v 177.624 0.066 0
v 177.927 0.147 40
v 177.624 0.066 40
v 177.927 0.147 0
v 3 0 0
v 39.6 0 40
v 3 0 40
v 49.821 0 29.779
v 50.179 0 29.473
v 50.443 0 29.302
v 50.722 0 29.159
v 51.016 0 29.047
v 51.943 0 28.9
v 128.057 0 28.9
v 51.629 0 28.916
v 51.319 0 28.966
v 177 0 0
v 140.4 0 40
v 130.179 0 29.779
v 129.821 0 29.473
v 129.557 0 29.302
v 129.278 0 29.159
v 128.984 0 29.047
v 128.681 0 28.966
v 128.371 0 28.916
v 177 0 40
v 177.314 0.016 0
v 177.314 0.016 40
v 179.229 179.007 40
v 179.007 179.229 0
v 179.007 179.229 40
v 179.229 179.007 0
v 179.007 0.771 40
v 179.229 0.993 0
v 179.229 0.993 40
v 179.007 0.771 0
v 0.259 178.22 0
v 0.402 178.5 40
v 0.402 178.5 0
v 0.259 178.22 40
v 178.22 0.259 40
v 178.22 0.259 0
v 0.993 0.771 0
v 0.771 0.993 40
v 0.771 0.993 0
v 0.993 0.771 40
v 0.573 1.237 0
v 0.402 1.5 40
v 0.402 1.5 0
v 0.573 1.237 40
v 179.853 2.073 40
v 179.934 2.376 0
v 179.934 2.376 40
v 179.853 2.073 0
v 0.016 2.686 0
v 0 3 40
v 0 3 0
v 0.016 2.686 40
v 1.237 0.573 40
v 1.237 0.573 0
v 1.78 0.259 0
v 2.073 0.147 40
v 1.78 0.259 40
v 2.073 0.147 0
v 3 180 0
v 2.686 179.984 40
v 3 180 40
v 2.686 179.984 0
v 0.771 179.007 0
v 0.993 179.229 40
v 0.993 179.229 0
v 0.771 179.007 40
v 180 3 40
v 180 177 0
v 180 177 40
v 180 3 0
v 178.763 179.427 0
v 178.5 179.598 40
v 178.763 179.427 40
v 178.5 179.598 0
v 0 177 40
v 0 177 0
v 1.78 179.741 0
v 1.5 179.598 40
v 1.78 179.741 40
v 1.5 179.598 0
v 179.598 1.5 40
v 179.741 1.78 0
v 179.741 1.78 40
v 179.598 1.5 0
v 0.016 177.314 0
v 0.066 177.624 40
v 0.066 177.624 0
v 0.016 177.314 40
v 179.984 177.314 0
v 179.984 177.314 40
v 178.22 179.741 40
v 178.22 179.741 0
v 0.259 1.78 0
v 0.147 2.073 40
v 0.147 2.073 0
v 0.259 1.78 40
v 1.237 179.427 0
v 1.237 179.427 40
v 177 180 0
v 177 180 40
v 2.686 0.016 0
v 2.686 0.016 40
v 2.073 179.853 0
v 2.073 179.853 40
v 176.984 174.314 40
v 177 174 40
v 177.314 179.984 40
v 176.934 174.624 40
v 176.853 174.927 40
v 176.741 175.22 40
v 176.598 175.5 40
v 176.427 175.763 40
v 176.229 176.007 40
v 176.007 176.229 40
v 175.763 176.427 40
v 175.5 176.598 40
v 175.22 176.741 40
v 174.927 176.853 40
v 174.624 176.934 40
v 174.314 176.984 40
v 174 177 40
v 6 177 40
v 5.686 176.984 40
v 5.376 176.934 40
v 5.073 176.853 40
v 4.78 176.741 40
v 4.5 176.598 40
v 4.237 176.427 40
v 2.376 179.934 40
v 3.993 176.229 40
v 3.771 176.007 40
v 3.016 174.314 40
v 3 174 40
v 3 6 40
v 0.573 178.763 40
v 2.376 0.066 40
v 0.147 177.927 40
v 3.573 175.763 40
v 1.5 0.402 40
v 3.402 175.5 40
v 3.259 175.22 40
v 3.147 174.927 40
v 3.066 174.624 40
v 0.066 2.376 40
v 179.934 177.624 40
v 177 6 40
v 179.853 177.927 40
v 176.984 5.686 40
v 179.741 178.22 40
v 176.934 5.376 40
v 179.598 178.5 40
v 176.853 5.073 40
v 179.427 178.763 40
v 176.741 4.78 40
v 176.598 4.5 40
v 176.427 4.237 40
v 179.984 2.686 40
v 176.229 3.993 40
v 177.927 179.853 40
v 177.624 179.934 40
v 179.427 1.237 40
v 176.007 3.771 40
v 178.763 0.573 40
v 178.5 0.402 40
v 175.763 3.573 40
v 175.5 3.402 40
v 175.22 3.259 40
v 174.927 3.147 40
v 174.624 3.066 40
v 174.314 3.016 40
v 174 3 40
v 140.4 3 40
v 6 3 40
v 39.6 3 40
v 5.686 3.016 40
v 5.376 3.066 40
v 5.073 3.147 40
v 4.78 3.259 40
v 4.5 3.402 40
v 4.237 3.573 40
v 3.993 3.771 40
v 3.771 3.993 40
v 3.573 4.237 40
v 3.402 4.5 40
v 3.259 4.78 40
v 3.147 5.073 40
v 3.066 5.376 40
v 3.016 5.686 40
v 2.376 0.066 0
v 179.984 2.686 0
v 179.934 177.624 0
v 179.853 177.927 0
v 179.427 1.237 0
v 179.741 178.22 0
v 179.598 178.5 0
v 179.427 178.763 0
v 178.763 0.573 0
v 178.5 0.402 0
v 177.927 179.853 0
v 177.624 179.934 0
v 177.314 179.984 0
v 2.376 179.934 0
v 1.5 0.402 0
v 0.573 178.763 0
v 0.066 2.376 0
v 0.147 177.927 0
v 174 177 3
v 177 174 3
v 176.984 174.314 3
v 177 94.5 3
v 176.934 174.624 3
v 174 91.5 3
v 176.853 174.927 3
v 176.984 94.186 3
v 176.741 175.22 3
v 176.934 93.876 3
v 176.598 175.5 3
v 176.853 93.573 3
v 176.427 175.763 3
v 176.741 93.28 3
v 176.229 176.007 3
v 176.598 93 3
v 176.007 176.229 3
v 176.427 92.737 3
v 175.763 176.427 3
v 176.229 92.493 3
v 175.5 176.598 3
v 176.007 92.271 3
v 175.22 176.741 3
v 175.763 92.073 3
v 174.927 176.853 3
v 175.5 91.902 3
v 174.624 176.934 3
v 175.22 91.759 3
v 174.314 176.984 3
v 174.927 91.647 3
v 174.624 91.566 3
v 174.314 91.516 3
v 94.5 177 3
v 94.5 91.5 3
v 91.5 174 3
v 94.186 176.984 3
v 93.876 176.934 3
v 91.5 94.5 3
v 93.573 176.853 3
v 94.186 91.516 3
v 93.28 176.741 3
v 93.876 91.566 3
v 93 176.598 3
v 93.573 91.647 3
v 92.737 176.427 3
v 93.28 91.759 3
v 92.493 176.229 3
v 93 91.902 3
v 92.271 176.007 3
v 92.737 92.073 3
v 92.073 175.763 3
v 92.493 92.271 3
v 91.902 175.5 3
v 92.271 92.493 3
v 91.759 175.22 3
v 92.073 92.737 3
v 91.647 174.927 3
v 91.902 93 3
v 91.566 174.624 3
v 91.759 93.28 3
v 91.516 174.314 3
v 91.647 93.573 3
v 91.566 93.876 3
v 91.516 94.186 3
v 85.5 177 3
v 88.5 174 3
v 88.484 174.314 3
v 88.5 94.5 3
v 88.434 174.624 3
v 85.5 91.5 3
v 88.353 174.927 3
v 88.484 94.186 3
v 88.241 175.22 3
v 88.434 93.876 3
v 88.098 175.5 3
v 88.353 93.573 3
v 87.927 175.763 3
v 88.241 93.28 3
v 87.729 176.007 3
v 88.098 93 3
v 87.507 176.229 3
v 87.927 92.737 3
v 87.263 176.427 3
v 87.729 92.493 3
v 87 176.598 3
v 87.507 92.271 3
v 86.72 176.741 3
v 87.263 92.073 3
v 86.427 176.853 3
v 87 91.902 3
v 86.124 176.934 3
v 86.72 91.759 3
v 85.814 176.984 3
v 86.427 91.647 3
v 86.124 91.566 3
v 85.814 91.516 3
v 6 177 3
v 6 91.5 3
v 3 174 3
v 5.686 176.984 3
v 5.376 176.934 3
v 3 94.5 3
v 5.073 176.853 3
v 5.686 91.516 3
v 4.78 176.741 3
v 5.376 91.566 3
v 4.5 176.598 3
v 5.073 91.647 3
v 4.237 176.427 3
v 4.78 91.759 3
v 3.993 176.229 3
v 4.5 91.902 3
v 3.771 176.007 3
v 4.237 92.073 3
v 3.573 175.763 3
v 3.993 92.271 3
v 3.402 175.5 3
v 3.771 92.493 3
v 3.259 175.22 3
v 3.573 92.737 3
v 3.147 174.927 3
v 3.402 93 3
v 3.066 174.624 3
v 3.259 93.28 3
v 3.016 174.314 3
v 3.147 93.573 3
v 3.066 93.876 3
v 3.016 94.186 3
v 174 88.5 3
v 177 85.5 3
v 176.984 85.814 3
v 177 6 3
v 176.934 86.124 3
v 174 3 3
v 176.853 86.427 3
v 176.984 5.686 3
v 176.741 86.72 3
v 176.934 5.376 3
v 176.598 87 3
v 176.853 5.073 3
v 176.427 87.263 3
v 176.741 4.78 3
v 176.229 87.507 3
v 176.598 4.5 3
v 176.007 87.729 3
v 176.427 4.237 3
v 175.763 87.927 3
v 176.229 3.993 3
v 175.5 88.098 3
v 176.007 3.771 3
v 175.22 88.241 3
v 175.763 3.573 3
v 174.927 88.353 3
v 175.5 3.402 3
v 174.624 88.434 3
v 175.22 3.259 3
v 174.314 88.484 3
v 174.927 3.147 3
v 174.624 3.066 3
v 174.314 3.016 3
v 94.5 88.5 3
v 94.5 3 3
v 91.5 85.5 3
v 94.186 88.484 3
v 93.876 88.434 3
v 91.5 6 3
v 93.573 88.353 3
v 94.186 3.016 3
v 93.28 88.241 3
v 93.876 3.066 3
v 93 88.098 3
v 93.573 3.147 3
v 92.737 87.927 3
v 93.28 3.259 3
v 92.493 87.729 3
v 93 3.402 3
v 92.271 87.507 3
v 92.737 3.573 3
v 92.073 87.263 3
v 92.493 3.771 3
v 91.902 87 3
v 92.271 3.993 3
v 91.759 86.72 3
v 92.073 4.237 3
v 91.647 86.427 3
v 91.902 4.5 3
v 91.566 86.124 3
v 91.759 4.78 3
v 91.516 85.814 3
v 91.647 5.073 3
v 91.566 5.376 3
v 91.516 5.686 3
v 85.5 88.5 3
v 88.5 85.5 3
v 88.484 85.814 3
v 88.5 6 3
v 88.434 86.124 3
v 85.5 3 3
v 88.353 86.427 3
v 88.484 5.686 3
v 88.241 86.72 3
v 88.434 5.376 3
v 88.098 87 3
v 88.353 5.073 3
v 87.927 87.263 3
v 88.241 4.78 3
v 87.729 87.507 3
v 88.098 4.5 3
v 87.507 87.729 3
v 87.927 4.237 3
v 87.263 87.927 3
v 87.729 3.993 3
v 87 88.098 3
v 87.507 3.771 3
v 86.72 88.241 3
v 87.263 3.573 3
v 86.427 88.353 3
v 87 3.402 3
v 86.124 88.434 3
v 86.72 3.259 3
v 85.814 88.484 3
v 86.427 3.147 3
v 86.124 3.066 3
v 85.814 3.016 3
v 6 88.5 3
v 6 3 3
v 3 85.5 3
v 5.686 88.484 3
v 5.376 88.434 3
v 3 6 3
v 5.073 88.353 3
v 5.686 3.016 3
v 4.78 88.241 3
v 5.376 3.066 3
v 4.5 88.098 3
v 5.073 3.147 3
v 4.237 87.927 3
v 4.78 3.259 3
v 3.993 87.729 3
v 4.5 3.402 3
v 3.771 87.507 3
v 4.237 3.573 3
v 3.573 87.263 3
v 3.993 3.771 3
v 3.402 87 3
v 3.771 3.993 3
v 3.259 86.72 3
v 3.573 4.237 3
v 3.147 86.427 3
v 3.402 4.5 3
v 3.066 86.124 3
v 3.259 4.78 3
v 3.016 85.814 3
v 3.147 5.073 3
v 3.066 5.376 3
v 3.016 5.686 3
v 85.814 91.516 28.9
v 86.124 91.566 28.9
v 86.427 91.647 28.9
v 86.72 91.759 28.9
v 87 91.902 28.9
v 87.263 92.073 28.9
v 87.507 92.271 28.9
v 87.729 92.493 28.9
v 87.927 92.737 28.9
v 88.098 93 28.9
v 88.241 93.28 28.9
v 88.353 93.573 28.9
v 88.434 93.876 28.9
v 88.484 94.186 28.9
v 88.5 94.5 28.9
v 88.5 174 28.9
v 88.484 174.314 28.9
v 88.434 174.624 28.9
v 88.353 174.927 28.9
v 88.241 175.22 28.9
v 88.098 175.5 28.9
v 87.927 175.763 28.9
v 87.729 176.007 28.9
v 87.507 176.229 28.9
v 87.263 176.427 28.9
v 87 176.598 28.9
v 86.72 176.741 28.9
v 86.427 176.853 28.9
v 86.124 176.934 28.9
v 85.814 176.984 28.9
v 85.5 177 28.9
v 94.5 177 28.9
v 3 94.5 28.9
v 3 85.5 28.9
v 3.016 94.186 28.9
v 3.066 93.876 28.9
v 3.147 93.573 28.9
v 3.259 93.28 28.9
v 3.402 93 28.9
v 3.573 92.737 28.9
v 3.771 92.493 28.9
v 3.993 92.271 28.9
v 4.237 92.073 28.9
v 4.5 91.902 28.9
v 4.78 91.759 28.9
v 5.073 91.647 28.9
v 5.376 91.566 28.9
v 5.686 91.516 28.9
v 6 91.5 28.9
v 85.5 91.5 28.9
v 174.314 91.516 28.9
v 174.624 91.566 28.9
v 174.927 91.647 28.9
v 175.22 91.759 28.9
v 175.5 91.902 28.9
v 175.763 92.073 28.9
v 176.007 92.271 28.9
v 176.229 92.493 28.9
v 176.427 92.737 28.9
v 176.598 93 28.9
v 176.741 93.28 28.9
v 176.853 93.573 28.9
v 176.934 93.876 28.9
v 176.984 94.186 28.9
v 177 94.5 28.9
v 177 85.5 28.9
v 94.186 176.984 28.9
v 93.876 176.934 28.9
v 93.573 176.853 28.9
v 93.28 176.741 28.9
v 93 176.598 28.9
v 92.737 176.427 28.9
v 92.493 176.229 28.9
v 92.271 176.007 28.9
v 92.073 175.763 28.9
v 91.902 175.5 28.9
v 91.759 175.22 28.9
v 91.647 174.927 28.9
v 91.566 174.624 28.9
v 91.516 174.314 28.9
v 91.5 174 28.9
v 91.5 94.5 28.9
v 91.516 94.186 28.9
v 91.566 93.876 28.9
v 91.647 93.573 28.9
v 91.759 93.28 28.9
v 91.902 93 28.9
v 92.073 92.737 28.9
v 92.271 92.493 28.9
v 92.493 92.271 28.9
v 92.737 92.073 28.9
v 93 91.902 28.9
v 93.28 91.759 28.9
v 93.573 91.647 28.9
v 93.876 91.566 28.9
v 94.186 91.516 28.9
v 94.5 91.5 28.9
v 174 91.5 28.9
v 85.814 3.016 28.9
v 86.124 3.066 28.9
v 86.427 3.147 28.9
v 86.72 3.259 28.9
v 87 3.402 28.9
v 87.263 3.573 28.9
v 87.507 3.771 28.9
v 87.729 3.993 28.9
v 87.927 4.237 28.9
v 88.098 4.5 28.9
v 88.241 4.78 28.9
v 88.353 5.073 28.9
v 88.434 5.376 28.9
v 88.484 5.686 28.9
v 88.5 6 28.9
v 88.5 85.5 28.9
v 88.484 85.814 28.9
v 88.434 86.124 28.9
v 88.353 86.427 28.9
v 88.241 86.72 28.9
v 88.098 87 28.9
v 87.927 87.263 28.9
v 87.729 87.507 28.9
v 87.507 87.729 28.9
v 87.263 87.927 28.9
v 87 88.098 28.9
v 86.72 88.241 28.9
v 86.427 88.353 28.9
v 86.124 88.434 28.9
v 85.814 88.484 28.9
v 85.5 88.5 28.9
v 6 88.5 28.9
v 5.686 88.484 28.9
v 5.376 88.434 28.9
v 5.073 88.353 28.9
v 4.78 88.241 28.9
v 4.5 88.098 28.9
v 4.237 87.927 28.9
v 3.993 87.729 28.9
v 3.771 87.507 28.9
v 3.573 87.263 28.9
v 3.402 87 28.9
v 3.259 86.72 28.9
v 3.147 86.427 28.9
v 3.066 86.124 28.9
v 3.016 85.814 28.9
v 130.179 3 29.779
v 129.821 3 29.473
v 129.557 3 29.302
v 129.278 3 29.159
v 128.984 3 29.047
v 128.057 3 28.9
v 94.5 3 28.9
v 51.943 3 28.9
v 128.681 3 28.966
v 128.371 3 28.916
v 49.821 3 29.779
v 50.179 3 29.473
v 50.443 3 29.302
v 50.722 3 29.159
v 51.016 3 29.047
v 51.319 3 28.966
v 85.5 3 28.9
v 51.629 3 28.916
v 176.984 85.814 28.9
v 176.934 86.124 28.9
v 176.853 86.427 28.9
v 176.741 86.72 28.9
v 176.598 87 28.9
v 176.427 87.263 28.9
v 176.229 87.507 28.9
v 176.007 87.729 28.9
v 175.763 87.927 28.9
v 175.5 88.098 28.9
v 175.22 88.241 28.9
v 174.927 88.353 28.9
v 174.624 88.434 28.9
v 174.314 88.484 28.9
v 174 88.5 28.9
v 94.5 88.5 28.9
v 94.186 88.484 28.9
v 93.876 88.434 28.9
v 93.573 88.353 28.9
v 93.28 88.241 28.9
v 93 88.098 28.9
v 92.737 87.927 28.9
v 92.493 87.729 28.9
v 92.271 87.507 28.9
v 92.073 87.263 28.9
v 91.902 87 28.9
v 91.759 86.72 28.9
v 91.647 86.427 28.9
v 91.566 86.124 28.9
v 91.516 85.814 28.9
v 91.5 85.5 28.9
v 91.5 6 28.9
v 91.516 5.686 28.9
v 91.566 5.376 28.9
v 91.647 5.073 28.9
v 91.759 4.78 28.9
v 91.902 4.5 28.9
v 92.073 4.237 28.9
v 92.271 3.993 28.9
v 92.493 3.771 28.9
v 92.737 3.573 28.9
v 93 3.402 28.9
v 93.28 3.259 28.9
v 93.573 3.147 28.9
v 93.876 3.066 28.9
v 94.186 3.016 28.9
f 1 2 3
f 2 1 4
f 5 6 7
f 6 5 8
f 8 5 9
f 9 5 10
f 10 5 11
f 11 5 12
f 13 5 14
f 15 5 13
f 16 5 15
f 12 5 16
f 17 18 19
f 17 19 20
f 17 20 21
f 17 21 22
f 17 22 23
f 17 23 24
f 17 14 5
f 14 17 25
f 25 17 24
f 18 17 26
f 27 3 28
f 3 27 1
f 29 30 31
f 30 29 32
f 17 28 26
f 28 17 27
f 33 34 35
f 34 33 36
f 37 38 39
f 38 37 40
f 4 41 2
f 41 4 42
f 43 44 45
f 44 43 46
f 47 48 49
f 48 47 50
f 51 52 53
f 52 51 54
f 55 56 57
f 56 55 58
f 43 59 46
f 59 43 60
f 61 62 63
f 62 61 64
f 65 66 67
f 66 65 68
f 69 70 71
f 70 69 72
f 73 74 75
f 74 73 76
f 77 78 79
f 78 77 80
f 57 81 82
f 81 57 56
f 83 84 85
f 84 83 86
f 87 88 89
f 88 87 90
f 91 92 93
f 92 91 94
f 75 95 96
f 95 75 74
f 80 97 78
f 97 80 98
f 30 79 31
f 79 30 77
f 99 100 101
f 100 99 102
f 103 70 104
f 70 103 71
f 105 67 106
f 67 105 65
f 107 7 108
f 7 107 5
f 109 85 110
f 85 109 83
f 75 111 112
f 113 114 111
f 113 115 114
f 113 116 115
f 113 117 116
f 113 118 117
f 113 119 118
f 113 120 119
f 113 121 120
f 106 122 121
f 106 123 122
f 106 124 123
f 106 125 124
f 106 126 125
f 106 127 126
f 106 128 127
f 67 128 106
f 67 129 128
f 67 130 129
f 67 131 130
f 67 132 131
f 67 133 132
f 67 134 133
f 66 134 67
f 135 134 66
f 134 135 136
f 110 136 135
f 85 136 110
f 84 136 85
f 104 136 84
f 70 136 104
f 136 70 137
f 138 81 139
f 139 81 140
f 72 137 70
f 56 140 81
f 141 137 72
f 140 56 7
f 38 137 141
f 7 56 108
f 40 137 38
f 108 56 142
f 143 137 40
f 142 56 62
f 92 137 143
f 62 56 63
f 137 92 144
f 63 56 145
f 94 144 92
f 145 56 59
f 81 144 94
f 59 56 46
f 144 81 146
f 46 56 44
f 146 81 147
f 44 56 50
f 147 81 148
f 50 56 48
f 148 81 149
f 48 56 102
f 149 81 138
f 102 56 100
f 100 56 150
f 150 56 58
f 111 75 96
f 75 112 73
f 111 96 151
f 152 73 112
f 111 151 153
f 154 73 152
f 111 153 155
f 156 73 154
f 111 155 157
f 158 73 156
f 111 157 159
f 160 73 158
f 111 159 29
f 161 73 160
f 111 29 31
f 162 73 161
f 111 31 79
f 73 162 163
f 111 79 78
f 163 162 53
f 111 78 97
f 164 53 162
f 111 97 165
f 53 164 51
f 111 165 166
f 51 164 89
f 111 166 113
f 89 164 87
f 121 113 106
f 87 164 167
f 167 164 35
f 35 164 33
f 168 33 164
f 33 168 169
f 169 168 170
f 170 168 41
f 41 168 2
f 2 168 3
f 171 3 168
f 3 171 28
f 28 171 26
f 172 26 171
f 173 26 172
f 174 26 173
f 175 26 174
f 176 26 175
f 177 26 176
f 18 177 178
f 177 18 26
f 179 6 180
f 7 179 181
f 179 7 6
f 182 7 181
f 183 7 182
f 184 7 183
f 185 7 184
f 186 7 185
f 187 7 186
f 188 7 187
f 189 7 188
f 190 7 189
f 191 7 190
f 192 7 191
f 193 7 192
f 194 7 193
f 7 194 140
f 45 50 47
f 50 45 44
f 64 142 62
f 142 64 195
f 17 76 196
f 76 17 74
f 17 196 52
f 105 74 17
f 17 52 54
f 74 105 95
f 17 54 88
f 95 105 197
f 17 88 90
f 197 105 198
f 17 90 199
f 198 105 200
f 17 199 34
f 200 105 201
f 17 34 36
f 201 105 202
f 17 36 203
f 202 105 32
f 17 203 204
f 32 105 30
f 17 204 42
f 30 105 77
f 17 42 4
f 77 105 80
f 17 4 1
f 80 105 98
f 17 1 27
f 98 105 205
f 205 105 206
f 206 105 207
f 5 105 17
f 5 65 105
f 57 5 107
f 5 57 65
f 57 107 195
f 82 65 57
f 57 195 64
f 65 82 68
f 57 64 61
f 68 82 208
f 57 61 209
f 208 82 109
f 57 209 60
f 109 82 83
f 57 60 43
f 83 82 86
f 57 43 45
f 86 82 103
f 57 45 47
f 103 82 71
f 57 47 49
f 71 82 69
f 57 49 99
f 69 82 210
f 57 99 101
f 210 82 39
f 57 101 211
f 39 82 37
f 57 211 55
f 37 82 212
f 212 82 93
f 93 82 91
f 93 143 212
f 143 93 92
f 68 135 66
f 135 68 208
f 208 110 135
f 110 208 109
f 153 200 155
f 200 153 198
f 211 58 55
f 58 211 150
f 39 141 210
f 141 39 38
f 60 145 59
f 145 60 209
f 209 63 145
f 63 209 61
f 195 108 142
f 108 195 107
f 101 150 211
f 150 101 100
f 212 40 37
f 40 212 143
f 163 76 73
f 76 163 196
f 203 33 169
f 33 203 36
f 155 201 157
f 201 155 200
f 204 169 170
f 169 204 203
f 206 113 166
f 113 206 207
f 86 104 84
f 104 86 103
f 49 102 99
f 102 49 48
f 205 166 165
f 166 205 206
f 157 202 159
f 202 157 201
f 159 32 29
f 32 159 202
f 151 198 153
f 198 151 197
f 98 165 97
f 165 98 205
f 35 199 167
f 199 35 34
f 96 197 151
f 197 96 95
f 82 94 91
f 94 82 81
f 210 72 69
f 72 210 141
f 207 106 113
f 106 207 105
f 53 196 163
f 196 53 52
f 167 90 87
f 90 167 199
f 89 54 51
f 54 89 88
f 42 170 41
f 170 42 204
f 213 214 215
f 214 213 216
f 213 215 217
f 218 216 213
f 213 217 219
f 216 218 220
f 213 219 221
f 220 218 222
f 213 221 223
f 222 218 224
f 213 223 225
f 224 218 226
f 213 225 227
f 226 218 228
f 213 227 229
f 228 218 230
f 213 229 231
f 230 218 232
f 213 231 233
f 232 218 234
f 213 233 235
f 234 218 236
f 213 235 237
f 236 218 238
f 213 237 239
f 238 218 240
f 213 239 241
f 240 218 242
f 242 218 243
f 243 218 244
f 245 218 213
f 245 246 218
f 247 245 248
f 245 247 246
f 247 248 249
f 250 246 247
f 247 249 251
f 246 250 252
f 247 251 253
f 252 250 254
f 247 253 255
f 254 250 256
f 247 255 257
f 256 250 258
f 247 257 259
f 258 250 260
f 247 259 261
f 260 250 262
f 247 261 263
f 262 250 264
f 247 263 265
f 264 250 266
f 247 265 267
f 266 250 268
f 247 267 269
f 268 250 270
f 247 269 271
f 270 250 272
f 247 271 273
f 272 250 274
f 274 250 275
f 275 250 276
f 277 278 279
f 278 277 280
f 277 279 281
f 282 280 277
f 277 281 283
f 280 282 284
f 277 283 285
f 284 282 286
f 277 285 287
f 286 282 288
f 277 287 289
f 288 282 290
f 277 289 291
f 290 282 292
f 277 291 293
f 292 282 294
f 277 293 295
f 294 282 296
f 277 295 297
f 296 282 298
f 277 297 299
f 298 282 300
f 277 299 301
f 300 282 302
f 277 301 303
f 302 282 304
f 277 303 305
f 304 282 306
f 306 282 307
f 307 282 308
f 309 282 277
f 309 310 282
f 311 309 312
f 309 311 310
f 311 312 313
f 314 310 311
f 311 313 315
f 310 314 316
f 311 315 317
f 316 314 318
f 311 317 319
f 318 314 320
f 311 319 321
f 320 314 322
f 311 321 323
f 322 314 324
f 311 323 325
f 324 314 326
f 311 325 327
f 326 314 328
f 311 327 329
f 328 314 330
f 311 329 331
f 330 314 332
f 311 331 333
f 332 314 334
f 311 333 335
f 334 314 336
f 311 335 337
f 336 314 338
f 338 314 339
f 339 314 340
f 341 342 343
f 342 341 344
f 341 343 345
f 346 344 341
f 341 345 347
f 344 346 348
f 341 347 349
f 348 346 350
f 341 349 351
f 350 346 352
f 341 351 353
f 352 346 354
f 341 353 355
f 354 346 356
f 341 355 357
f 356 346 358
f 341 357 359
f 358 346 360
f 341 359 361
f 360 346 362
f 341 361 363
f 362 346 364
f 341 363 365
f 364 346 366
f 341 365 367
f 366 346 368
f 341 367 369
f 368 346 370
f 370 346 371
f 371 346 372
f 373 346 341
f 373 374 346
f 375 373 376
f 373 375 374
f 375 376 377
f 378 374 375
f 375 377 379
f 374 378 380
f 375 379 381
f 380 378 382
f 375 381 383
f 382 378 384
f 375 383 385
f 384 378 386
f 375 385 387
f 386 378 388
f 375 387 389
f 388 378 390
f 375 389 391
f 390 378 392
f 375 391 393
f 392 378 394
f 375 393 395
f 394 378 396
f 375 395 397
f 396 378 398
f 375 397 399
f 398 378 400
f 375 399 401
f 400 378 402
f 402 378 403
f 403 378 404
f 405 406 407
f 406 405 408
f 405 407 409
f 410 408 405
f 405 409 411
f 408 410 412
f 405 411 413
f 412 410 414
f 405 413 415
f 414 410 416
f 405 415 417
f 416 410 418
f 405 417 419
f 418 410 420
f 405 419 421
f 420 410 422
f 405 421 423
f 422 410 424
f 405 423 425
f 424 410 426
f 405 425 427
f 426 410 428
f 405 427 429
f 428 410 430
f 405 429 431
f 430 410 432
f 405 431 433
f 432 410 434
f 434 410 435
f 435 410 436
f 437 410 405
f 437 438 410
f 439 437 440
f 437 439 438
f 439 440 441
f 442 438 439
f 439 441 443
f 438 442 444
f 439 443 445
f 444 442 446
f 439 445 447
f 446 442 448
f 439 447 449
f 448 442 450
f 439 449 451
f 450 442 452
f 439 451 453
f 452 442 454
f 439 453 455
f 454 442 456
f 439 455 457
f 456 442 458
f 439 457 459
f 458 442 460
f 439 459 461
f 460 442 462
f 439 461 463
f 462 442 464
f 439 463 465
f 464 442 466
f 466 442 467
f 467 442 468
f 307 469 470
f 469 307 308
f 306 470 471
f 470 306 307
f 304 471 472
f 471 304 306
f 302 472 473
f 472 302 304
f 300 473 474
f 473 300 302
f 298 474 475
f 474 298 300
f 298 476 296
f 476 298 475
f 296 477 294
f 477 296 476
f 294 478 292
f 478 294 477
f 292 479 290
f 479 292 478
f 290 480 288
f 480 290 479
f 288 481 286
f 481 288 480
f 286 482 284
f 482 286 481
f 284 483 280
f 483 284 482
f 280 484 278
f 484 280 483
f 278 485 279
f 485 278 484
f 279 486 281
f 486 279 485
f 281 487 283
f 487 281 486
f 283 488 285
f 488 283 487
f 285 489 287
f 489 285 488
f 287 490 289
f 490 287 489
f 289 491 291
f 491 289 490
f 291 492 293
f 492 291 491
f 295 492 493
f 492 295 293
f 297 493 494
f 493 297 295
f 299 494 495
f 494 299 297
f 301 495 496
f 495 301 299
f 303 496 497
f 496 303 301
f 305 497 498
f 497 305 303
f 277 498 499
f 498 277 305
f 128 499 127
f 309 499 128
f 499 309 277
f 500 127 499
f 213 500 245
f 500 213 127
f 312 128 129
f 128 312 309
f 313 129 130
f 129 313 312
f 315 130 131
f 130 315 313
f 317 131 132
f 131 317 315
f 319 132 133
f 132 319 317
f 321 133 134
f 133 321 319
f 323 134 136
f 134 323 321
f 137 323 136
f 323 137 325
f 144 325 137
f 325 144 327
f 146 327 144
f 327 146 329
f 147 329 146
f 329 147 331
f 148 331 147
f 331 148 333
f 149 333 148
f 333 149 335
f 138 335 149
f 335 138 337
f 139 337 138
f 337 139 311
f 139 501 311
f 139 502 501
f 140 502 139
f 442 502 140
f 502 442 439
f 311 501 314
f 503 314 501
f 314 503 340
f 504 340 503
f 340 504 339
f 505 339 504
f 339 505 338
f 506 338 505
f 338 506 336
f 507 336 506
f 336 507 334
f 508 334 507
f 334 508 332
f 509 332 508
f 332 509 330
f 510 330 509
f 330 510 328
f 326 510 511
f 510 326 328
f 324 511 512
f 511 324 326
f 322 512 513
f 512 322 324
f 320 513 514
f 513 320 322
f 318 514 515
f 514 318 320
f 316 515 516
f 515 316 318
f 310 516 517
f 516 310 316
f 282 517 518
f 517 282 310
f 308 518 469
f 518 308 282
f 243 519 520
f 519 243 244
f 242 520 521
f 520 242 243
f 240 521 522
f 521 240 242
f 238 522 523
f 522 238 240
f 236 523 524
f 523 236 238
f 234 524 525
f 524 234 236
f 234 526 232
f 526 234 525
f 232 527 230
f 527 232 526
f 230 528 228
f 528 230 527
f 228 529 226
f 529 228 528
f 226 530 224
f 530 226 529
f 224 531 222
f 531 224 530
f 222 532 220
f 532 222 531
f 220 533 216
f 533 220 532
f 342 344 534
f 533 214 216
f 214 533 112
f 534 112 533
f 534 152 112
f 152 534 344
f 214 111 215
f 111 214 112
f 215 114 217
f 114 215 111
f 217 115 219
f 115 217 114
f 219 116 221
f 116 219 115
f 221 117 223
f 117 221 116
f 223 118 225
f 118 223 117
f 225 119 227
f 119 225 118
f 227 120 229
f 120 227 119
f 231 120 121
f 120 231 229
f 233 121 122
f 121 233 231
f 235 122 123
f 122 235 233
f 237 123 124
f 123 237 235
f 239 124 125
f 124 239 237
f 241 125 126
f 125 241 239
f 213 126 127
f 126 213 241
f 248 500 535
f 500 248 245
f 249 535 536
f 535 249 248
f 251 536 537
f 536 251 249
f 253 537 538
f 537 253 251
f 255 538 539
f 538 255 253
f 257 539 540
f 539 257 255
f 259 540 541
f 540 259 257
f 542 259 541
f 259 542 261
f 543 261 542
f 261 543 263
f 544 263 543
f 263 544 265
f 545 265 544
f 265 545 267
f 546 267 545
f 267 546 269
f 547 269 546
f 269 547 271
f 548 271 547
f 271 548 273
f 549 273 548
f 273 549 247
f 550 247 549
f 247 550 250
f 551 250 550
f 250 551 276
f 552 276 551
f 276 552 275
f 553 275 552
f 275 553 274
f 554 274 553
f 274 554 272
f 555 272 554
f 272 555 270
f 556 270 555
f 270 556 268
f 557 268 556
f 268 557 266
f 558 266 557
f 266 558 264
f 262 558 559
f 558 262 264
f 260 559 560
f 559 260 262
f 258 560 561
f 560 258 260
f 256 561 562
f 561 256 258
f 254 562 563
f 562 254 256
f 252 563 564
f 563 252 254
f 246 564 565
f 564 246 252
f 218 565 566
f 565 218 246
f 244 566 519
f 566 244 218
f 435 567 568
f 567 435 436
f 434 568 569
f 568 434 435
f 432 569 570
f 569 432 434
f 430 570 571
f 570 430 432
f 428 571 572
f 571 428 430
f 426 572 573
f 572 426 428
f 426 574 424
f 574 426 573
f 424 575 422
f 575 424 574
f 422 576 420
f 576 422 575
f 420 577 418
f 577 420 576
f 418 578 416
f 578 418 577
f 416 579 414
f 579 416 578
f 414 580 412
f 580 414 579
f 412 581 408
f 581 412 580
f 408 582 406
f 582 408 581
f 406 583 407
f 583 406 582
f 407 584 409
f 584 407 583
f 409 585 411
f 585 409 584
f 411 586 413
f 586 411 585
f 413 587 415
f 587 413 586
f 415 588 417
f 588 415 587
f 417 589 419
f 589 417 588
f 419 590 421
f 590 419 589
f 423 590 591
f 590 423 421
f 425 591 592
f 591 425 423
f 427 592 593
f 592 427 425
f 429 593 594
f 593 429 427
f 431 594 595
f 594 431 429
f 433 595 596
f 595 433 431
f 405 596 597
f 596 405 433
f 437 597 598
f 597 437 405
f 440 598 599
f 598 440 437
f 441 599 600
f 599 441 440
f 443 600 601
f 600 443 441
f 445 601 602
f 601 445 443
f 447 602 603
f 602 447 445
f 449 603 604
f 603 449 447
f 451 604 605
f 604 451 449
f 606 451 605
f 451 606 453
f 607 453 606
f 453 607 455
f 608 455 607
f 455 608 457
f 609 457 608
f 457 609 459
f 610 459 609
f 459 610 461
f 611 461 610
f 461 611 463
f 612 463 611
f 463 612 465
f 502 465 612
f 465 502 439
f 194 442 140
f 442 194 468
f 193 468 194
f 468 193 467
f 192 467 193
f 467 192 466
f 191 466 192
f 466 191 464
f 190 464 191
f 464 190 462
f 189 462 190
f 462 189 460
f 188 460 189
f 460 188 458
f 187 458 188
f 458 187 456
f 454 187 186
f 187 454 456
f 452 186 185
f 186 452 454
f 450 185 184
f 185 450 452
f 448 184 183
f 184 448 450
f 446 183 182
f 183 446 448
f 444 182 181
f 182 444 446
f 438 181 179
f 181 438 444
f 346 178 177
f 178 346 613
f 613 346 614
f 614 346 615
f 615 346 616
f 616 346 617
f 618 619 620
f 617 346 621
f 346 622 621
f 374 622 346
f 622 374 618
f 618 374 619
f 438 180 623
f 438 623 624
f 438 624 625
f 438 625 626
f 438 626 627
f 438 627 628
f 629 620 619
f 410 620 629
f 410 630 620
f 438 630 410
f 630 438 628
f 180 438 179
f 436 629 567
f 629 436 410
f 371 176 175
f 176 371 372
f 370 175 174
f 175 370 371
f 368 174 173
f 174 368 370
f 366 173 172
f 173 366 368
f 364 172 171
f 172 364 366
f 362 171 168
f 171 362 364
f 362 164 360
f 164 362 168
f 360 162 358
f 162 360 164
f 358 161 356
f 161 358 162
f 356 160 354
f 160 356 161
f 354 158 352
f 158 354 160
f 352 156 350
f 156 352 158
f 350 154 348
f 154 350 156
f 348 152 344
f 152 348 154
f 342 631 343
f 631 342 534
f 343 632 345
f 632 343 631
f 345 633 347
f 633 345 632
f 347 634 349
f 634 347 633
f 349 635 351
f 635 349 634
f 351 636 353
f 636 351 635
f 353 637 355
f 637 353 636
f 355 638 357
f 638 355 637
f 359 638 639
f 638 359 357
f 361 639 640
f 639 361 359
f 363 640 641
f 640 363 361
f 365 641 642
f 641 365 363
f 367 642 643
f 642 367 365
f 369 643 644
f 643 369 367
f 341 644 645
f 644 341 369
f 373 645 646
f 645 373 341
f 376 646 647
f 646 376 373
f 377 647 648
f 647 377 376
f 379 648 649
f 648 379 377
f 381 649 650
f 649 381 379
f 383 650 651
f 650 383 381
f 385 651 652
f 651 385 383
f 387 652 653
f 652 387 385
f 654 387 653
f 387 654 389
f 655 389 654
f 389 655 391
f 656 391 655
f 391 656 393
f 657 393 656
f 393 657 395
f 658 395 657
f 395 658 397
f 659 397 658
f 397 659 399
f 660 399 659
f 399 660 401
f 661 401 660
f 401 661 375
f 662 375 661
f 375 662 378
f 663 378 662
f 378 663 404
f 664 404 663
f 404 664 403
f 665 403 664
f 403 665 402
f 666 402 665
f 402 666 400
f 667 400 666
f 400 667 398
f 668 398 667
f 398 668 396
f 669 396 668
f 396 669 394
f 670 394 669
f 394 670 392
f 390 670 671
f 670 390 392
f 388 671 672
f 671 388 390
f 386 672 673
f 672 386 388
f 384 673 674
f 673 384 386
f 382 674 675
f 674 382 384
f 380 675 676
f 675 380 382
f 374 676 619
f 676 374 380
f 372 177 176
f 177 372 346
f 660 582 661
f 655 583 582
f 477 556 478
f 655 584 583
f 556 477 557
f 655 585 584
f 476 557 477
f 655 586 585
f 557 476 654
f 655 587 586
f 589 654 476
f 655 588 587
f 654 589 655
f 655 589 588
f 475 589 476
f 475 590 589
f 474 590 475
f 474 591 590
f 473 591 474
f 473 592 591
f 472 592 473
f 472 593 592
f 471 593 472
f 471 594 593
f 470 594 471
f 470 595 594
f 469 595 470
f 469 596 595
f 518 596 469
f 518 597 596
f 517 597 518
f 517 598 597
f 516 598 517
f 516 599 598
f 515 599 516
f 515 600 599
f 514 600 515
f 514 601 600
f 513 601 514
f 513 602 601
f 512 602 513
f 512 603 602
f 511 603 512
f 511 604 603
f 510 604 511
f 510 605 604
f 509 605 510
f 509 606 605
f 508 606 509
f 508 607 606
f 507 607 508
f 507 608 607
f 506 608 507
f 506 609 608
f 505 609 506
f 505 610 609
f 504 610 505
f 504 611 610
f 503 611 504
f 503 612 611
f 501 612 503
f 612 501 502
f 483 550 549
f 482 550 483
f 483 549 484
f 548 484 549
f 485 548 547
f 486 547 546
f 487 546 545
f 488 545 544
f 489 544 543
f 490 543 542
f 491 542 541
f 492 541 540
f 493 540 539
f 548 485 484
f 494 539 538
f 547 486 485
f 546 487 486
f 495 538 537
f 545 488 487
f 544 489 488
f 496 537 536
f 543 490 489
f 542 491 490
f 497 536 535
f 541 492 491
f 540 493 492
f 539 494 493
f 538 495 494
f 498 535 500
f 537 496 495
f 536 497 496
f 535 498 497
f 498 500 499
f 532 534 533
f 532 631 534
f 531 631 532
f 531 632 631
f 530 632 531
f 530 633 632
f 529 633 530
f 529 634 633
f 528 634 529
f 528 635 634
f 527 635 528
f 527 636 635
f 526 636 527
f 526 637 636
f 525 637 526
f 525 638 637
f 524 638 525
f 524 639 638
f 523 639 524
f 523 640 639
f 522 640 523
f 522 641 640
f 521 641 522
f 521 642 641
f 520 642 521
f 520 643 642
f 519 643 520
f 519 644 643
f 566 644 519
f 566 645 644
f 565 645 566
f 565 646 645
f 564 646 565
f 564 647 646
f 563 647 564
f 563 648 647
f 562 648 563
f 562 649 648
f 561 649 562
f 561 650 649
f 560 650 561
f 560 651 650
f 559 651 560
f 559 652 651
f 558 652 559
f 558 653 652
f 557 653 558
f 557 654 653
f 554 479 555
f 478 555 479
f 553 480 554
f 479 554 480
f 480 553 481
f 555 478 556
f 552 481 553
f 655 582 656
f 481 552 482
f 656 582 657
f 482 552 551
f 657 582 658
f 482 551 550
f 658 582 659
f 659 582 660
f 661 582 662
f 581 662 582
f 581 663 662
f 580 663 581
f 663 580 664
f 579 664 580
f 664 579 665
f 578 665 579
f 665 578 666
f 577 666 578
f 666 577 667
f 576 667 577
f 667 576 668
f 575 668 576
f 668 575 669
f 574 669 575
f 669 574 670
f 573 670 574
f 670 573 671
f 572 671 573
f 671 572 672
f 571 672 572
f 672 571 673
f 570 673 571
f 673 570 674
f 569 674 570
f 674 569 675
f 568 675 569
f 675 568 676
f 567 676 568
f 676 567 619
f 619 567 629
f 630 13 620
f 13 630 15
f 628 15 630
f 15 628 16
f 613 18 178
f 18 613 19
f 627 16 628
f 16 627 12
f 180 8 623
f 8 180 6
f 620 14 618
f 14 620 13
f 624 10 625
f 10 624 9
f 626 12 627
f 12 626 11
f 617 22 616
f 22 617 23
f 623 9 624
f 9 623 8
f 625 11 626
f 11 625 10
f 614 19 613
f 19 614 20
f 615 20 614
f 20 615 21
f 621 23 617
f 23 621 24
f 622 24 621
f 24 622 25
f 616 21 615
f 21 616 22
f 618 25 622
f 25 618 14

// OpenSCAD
/*
 * Copyright 2022 Code and Make (codeandmake.com)
 * 
 * Permission is hereby granted, free of charge, to any person obtaining a copy
 * of this software and associated documentation files (the "Software"), to deal
 * in the Software without restriction, including without limitation the rights
 * to use, copy, modify, merge, publish, distribute, sublicense, and/or sell
 * copies of the Software, and to permit persons to whom the Software is
 * furnished to do so, subject to the following conditions:
 * 
 * The above copyright notice and this permission notice shall be included in
 * all copies or substantial portions of the Software.
 * 
 * THE SOFTWARE IS PROVIDED "AS IS", WITHOUT WARRANTY OF ANY KIND, EXPRESS OR
 * IMPLIED, INCLUDING BUT NOT LIMITED TO THE WARRANTIES OF MERCHANTABILITY,
 * FITNESS FOR A PARTICULAR PURPOSE AND NONINFRINGEMENT. IN NO EVENT SHALL THE
 * AUTHORS OR COPYRIGHT HOLDERS BE LIABLE FOR ANY CLAIM, DAMAGES OR OTHER
 * LIABILITY, WHETHER IN AN ACTION OF CONTRACT, TORT OR OTHERWISE, ARISING FROM,
 * OUT OF OR IN CONNECTION WITH THE SOFTWARE OR THE USE OR OTHER DEALINGS IN THE
 * SOFTWARE.
 */

/*
 * Drawer System by Code and Make (https://codeandmake.com/)
 *
 * https://codeandmake.com/post/fully-customizable-drawer-system
 *
 * Drawer System v1.2 (2 March 2022)
 */

/* [General] */

// Drawer or Chest?
Part = 1; // [1: Drawer, 2: Chest, 3: All - Preview Only]

// Thickness of the material
Material_Thickness = 3; // [1:0.1:5]

/* [Drawer] */

// Width of the drawer
Drawer_Width = 180; // [20:1:300]

// Height of the drawer
Drawer_Height = 40; // [20:1:300]

// Depth of the drawer
Drawer_Depth = 180; // [20:1:300]

// Number of sections across
Drawer_Sections_Across = 2; // [1:1:10]

// Number of sections deep
Drawer_Sections_Deep = 2; // [1:1:10]

// Height of section wall as percentage of possible height
Drawer_Section_Wall_Height_Percent = 70; // [0:1:100]

// Width of handle as percentage of possible width
Handle_Width_Percent = 60; // [0:1:100]

// Height of handle as percentage of possible height
Handle_Height_Percent = 30; // [0:1:100]

// How to cutout section walls based on handle settings
Section_Wall_Cutout = 1; // [0: None, 1: Straight, 2: Rotational]

/* [Chest] */

// Number of drawers across
Drawers_Across = 1; // [1:1:10]

// Number of drawers high
Drawers_High = 4; // [1:1:10]

// Amount of gap around each side of the drawer (sides, top and rear)
Drawer_Gap = 1; // [0.1:0.1:5]

// Width of runners as percentage of possible width
Runner_Width_Percent = 50; // [1:1:100]

// Height of runners as multiplier of material thickness
Runner_Height_Multiplier = 1; // [1:0.1:10]

/* [All - Preview] */

// Show drawers in chest in 'All - Preview Only' mode
Show_Drawers_In_Preview = 0; // [0: No, 1: Yes]

// Amount to slide out drawers in 'All - Preview Only' mode as percentage of drawer depth
Slide_Out_Drawers_In_Preview_Percent = 0; // [0:1:200]

module drawerSystem() {
  $fn = 60;

  drawerSectionWidth = (Drawer_Width - (Material_Thickness * (Drawer_Sections_Across + 1))) / Drawer_Sections_Across;
  drawerSectionDepth = (Drawer_Depth - (Material_Thickness * (Drawer_Sections_Deep + 1))) / Drawer_Sections_Deep;

  chestSectionWidth = Drawer_Width + (Drawer_Gap * 2);
  chestSectionHeight = Drawer_Height + Drawer_Gap;
  chestSectionDepth = Drawer_Depth + Drawer_Gap;

  runnerHeight = Material_Thickness * Runner_Height_Multiplier;

  module drawerSectionProfile() {
    translate([Material_Thickness, Material_Thickness, 0]) {
      offset(r = Material_Thickness) {
        square(size = [drawerSectionWidth - (Material_Thickness * 2), drawerSectionDepth - (Material_Thickness * 2)]);
      }
    }
  }

  module drawerSectionsProfile() {
    for (x = [0:Drawer_Sections_Across - 1]) {
      for (y = [0:Drawer_Sections_Deep - 1]) {
        translate([Material_Thickness + (x * (drawerSectionWidth + Material_Thickness)),
          Material_Thickness + (y * (drawerSectionDepth + Material_Thickness)),
          0]) {
          drawerSectionProfile();
        }
      }
    }
  }

  module drawerOuterProfile() {
    translate([Material_Thickness, Material_Thickness, 0]) {
      offset(r = Material_Thickness) {
        square(size = [Drawer_Width - (Material_Thickness * 2), Drawer_Depth - (Material_Thickness * 2)]);
      }
    }
  }

  module drawerInnerProfile() {
    translate([Material_Thickness * 2, Material_Thickness * 2, 0]) {
      offset(r = Material_Thickness) {
        square(size = [Drawer_Width - (Material_Thickness * 4), Drawer_Depth - (Material_Thickness * 4)]);
      }
    }
  }

  module drawerBody() {
    difference() {
      linear_extrude(height = Drawer_Height, convexity = 10) {
        drawerOuterProfile();
      }

      translate([0, 0, Material_Thickness]) {
        linear_extrude(height = Drawer_Height, convexity = 10) {
          drawerSectionsProfile();
        }
      }

      if (Drawer_Section_Wall_Height_Percent < 100) {
        translate([0, 0, Drawer_Height + 0.1]) {
          mirror([0, 0, 1]) {
            linear_extrude(height = (Drawer_Height - Material_Thickness) * ((100 - Drawer_Section_Wall_Height_Percent) / 100) + 0.1, convexity = 10) {
              drawerInnerProfile();
            }
          }
        }
      }
    }
  }

  module handleHalfProfile() {
    topX = (((Drawer_Width / 2) - (Material_Thickness * 2)) * (Handle_Width_Percent / 100));
    bottomY = (-Drawer_Height + Material_Thickness) * (Handle_Height_Percent / 100);

    intersection() {
      offset(r = Material_Thickness) {
        offset(r = -Material_Thickness) {
          polygon(points = [
            [-(Material_Thickness * 2), (Material_Thickness * 2)],
            [topX + (Material_Thickness * 2), (Material_Thickness * 2)],
            [max(topX + bottomY, Material_Thickness), max(bottomY, -topX + Material_Thickness)],
            [-(Material_Thickness * 2), max(bottomY, -topX + Material_Thickness)]
          ]);
        }
      }

      polygon(points = [
        [0, 0],
        [topX, 0],
        [max(topX + bottomY, 0), max(bottomY, -topX)],
        [0, max(bottomY, -topX)]
      ]);
    }

    if(Section_Wall_Cutout == 0) {
      square(size = [topX, 1]);
    }
  }

  module handlProfile() {
    handleHalfProfile();
    mirror([1, 0, 0]) {
      handleHalfProfile();
    }
  }

  module handleCutoutBody() {
    hull() {
      translate([Drawer_Width / 2, Material_Thickness, Drawer_Height]) {
        rotate([90, 0, 0]) {
          linear_extrude(height = Material_Thickness + 1, convexity = 10) {
            handlProfile();
          }
        }
      }

      if(Section_Wall_Cutout == 1) {
        translate([Drawer_Width / 2, Material_Thickness, Drawer_Height]) {
          mirror([0, 1, 0]) {
            linear_extrude(height = Material_Thickness + 1, convexity = 10) {
              handlProfile();
            }
          }
        }
      }
    }

    if(Section_Wall_Cutout == 2) {
      seperatorHandleCutoutRotational();
    }
  }

  module seperatorHandleCutoutRotational() {
    translate([Drawer_Width / 2, Material_Thickness, Drawer_Height]) {
      rotate([0, 90, 0]) {
        rotate_extrude(convexity = 10, $fn = 120) {
          rotate([0, 0, 90]) {
            handlProfile();  
          }
        }
      }
    }
  }

  module drawer() {
    difference() {
      drawerBody();
      handleCutoutBody();
    }
  }

  module allDrawers() {
    for (x = [0:Drawers_Across - 1]) {
      for (y = [0:Drawers_High - 1]) {
        translate([(chestSectionWidth + Material_Thickness) * x, (chestSectionHeight + runnerHeight) * y, 0]) {
          translate([Material_Thickness + Drawer_Gap, Material_Thickness, Material_Thickness + Drawer_Gap]) {
            rotate([-90, 0, 0]) {
              translate([0, -Drawer_Depth, 0]) {
                drawer();
              }
            }
          }
        }
      }
    }
  }

  module chestSectionProfile() {
    square(size = [chestSectionWidth, chestSectionHeight]);
  }

  module chestSectionsProfile() {
    for (x = [0:Drawers_Across - 1]) {
      for (y = [0:Drawers_High - 1]) {
        translate([Material_Thickness + ((chestSectionWidth + Material_Thickness) * x),
          Material_Thickness + ((chestSectionHeight + runnerHeight) * y),
          0]) {
          chestSectionProfile();
        }
      }
    }
  }

  module chestColumnProfile() {
    translate([Material_Thickness, Material_Thickness, 0]) {
      square(size = [chestSectionWidth, (chestSectionHeight * Drawers_High) + (runnerHeight * (Drawers_High - 1))]);
    }
  }

  module chestColumnsBody() {
    for (x = [0:Drawers_Across - 1]) {
      translate([(chestSectionWidth + Material_Thickness) * x, 0, Material_Thickness]) {
        linear_extrude(height = chestSectionDepth + 1, convexity = 10) {
          chestColumnProfile();
        }
      }
    }
  }

  module chestOuterProfile() {
    translate([Material_Thickness, Material_Thickness, 0]) {
      offset(r = Material_Thickness) {
        square(size = [((chestSectionWidth + Material_Thickness) * Drawers_Across) - Material_Thickness, (chestSectionHeight * Drawers_High) + (runnerHeight * (Drawers_High - 1))]);
      }
    }
  }

  module drawerRunnerProfile() {
    drawRunnerMinX = Drawer_Gap + Material_Thickness;
    drawRunnerMaxX = chestSectionWidth / 2;
    drawRunnerX = drawRunnerMinX + (drawRunnerMaxX - drawRunnerMinX) * (Runner_Width_Percent / 100);

    if (Runner_Width_Percent < 100) {
      intersection() {
        offset(r = Material_Thickness) {
          offset(r = -Material_Thickness) {
            polygon(points = [
              [-Material_Thickness, 0],
              [-Material_Thickness, chestSectionDepth + Material_Thickness],
              [drawRunnerX, chestSectionDepth + Material_Thickness],
              [drawRunnerX, 0],
            ]);
          }
        }

        square(size = [chestSectionWidth, chestSectionDepth]);
      }
    } else {
      square(size = [chestSectionWidth, chestSectionDepth]);
    }
  }

  module chestRunnersBody() {
    for (x = [0:Drawers_Across - 1]) {
      translate([(chestSectionWidth + Material_Thickness) * x, 0, 0]) {
        translate([Material_Thickness, Material_Thickness, Material_Thickness + chestSectionDepth]) {
          rotate([-90, 0, 0]) {
            linear_extrude(height = (chestSectionHeight * Drawers_High) + (runnerHeight * (Drawers_High - 1)), convexity = 10) {
              drawerRunnerProfile();

              translate([chestSectionWidth, 0, 0]) {
                mirror([1, 0, 0]) {
                  drawerRunnerProfile();
                }
              }
            }
          }
        }
      }
    }
  }

  module chestRunnerCutoutBody() {
    difference() {
      chestColumnsBody();
      chestRunnersBody();
    }
  }

  module chestBody() {
    difference() {
      linear_extrude(height = chestSectionDepth + Material_Thickness, convexity = 10) {
        chestOuterProfile();
      }

      translate([0, 0, Material_Thickness]) {
        linear_extrude(height = chestSectionDepth + Material_Thickness, convexity = 10) {
          chestSectionsProfile();
        }
      }

      chestRunnerCutoutBody();
    }
  }

  if (Part == 1) {
    drawer();
  } else if (Part == 2) {
    chestBody();

    if ($preview && Show_Drawers_In_Preview) {
      %allDrawers();
    }
  } else if (Part == 3) {
    if ($preview) {
      translate([0, chestSectionDepth + Material_Thickness, 0]) {
        rotate([90, 0, 0]) {
          %chestBody();
          translate([0, 0, Drawer_Depth * (Slide_Out_Drawers_In_Preview_Percent / 100)]) {
          #allDrawers();
          }
        }
      }
    }
  }
}

drawerSystem();

echo("\r\tThis design is completely free and shared under a permissive license.\r\tYour support is hugely appreciated: codeandmake.com/support\r");
